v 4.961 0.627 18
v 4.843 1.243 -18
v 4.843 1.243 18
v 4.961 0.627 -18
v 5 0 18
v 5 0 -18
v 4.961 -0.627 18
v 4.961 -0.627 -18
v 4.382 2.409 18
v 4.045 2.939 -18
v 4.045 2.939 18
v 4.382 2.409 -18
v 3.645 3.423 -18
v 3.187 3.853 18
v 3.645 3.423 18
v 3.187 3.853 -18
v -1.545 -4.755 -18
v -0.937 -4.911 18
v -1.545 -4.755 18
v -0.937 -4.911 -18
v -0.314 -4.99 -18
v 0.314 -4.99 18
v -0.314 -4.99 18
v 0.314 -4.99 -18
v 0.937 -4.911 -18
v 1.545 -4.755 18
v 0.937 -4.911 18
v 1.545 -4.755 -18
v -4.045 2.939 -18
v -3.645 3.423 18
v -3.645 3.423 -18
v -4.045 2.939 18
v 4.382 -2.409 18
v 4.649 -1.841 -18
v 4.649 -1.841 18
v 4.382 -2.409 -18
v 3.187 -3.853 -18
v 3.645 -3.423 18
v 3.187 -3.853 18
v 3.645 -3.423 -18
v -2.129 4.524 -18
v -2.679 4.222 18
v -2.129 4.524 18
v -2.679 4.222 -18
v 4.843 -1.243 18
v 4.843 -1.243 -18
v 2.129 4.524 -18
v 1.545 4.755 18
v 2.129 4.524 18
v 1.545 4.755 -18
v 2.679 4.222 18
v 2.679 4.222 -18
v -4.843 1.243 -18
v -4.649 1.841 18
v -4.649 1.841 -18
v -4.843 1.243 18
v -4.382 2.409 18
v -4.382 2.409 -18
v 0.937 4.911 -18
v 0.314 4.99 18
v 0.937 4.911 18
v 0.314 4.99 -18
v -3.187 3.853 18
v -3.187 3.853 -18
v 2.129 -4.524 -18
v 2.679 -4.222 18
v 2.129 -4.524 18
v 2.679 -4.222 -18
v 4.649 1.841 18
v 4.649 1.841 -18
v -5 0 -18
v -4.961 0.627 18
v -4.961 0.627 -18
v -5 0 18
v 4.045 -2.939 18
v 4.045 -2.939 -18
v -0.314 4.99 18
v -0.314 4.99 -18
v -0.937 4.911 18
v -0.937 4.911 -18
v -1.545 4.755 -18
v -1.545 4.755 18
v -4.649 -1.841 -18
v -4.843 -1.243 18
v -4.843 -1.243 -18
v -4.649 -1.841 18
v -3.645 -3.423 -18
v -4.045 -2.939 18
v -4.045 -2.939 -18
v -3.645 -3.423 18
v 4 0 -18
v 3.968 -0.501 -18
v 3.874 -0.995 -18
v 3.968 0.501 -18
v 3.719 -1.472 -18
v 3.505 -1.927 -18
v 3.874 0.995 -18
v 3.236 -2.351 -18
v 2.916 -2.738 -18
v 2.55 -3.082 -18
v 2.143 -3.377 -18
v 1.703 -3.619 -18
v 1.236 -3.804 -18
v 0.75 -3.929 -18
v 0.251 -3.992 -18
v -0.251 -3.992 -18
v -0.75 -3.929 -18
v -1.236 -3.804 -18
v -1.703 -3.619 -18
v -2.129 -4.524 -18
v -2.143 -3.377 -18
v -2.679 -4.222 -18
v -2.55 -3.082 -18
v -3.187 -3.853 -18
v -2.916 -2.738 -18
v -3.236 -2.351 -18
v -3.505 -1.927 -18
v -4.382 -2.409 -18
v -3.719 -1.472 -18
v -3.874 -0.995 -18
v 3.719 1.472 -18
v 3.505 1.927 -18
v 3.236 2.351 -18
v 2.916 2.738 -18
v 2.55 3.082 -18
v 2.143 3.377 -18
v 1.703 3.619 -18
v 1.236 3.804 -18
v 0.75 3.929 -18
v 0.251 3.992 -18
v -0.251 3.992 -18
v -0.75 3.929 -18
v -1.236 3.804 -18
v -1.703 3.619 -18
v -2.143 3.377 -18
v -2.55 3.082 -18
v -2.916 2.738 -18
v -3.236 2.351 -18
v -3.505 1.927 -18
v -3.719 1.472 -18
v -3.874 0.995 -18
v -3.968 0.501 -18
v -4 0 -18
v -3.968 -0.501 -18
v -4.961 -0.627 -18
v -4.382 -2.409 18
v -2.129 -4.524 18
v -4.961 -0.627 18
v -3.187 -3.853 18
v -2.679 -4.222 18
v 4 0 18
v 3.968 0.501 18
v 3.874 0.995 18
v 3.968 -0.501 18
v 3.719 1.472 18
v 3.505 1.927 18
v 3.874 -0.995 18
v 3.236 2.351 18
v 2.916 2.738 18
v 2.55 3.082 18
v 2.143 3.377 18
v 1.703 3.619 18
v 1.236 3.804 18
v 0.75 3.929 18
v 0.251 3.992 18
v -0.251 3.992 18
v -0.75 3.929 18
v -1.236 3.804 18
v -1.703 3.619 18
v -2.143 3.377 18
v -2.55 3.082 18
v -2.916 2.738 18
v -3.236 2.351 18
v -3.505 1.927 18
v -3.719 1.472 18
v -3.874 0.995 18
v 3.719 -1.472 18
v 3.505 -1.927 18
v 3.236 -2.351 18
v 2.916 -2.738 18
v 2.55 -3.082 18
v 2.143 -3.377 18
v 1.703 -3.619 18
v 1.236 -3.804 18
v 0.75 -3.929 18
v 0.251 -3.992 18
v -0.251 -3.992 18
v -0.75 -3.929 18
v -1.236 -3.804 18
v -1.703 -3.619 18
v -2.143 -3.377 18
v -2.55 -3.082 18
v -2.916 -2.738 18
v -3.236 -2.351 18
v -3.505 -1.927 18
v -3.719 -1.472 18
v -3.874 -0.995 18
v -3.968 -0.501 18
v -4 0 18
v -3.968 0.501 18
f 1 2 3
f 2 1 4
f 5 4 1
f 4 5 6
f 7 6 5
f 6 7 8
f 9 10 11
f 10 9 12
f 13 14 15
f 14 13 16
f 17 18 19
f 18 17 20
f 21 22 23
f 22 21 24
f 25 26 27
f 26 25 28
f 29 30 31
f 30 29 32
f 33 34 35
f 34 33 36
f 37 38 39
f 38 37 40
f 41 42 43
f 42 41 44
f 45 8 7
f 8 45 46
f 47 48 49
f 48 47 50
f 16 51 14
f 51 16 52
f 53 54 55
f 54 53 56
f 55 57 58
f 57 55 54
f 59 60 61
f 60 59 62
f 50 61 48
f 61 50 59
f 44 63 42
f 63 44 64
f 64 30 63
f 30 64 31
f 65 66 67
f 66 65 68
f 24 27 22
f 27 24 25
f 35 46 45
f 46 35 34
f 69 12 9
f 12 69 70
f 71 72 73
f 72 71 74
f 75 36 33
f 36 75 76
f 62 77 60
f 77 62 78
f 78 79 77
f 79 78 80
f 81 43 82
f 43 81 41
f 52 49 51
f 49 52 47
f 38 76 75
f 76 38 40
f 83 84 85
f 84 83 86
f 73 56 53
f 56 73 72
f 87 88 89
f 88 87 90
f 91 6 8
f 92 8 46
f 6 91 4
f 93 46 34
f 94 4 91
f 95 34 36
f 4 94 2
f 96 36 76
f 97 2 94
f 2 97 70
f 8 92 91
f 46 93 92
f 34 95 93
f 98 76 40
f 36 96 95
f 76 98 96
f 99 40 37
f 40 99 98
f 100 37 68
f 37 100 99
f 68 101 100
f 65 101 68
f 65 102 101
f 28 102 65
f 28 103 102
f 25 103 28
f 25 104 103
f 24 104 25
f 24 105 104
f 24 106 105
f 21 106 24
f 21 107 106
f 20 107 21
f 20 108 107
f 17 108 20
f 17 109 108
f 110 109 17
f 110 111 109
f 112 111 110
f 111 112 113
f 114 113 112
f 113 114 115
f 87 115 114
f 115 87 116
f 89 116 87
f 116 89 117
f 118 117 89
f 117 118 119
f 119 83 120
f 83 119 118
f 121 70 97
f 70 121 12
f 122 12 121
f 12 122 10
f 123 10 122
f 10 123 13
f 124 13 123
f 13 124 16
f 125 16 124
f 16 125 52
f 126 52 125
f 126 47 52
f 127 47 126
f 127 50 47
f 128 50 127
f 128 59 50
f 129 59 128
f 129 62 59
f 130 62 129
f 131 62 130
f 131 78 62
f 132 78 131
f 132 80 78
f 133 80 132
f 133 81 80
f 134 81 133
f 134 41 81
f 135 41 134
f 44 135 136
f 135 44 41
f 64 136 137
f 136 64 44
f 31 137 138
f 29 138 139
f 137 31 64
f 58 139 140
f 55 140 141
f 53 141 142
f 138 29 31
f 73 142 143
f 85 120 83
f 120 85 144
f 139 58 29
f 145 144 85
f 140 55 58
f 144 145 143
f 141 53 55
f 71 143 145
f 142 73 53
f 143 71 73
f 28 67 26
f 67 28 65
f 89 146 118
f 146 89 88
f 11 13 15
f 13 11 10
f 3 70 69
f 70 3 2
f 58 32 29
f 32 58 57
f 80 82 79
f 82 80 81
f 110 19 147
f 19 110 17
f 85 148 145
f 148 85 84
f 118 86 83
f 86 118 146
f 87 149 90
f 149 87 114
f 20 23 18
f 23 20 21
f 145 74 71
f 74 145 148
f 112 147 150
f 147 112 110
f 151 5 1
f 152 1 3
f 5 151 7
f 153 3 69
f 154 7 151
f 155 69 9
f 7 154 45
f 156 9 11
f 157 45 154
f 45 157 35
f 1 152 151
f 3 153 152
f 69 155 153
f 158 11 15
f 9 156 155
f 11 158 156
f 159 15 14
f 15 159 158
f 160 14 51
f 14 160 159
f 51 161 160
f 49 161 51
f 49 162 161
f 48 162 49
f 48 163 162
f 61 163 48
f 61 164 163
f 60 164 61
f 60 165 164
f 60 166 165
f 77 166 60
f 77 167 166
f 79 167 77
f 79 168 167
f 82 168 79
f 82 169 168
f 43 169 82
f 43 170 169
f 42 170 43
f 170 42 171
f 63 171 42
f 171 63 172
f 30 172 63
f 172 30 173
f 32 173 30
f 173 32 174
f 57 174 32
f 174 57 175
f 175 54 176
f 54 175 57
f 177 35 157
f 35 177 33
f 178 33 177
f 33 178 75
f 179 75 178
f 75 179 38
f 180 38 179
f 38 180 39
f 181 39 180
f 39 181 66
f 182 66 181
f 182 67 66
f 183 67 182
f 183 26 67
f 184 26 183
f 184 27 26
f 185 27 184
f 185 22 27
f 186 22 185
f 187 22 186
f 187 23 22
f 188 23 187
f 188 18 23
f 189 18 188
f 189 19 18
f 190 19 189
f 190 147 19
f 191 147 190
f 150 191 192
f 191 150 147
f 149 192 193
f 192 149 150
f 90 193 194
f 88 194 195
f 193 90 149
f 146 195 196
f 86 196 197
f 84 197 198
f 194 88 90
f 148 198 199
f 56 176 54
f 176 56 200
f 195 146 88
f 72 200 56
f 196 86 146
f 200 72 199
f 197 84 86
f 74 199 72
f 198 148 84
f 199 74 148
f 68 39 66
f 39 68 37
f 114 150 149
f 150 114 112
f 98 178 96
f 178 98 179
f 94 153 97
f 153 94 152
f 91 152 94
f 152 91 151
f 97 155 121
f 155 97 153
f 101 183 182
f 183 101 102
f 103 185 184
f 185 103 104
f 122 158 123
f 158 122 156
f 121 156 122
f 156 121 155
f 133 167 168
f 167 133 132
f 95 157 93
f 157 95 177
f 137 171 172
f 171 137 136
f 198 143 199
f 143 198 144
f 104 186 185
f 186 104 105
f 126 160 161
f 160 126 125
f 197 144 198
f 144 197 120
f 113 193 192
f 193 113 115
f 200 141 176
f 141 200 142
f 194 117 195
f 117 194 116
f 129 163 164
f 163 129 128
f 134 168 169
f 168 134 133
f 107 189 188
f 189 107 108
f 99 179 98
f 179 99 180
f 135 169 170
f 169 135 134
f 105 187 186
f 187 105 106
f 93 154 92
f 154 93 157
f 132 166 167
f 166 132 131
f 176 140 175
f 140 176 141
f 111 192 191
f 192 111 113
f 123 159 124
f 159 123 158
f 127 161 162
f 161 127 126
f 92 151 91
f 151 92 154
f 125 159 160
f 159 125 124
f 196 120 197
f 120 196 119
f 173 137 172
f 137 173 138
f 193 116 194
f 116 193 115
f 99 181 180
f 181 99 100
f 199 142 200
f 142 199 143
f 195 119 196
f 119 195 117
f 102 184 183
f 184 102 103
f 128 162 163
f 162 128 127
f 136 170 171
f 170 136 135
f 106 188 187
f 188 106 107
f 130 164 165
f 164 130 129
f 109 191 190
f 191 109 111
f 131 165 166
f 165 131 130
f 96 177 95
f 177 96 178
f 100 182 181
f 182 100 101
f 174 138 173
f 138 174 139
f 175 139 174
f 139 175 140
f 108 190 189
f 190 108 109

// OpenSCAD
$fn = 50;


difference() {
	union() {
		translate(v = [0, 0, -18.0000000000]) {
			cylinder(h = 36, r = 5.0000000000);
		}
	}
	union() {
		translate(v = [0, 0, -100.0000000000]) {
			cylinder(h = 200, r = 4.0000000000);
		}
	}
}
